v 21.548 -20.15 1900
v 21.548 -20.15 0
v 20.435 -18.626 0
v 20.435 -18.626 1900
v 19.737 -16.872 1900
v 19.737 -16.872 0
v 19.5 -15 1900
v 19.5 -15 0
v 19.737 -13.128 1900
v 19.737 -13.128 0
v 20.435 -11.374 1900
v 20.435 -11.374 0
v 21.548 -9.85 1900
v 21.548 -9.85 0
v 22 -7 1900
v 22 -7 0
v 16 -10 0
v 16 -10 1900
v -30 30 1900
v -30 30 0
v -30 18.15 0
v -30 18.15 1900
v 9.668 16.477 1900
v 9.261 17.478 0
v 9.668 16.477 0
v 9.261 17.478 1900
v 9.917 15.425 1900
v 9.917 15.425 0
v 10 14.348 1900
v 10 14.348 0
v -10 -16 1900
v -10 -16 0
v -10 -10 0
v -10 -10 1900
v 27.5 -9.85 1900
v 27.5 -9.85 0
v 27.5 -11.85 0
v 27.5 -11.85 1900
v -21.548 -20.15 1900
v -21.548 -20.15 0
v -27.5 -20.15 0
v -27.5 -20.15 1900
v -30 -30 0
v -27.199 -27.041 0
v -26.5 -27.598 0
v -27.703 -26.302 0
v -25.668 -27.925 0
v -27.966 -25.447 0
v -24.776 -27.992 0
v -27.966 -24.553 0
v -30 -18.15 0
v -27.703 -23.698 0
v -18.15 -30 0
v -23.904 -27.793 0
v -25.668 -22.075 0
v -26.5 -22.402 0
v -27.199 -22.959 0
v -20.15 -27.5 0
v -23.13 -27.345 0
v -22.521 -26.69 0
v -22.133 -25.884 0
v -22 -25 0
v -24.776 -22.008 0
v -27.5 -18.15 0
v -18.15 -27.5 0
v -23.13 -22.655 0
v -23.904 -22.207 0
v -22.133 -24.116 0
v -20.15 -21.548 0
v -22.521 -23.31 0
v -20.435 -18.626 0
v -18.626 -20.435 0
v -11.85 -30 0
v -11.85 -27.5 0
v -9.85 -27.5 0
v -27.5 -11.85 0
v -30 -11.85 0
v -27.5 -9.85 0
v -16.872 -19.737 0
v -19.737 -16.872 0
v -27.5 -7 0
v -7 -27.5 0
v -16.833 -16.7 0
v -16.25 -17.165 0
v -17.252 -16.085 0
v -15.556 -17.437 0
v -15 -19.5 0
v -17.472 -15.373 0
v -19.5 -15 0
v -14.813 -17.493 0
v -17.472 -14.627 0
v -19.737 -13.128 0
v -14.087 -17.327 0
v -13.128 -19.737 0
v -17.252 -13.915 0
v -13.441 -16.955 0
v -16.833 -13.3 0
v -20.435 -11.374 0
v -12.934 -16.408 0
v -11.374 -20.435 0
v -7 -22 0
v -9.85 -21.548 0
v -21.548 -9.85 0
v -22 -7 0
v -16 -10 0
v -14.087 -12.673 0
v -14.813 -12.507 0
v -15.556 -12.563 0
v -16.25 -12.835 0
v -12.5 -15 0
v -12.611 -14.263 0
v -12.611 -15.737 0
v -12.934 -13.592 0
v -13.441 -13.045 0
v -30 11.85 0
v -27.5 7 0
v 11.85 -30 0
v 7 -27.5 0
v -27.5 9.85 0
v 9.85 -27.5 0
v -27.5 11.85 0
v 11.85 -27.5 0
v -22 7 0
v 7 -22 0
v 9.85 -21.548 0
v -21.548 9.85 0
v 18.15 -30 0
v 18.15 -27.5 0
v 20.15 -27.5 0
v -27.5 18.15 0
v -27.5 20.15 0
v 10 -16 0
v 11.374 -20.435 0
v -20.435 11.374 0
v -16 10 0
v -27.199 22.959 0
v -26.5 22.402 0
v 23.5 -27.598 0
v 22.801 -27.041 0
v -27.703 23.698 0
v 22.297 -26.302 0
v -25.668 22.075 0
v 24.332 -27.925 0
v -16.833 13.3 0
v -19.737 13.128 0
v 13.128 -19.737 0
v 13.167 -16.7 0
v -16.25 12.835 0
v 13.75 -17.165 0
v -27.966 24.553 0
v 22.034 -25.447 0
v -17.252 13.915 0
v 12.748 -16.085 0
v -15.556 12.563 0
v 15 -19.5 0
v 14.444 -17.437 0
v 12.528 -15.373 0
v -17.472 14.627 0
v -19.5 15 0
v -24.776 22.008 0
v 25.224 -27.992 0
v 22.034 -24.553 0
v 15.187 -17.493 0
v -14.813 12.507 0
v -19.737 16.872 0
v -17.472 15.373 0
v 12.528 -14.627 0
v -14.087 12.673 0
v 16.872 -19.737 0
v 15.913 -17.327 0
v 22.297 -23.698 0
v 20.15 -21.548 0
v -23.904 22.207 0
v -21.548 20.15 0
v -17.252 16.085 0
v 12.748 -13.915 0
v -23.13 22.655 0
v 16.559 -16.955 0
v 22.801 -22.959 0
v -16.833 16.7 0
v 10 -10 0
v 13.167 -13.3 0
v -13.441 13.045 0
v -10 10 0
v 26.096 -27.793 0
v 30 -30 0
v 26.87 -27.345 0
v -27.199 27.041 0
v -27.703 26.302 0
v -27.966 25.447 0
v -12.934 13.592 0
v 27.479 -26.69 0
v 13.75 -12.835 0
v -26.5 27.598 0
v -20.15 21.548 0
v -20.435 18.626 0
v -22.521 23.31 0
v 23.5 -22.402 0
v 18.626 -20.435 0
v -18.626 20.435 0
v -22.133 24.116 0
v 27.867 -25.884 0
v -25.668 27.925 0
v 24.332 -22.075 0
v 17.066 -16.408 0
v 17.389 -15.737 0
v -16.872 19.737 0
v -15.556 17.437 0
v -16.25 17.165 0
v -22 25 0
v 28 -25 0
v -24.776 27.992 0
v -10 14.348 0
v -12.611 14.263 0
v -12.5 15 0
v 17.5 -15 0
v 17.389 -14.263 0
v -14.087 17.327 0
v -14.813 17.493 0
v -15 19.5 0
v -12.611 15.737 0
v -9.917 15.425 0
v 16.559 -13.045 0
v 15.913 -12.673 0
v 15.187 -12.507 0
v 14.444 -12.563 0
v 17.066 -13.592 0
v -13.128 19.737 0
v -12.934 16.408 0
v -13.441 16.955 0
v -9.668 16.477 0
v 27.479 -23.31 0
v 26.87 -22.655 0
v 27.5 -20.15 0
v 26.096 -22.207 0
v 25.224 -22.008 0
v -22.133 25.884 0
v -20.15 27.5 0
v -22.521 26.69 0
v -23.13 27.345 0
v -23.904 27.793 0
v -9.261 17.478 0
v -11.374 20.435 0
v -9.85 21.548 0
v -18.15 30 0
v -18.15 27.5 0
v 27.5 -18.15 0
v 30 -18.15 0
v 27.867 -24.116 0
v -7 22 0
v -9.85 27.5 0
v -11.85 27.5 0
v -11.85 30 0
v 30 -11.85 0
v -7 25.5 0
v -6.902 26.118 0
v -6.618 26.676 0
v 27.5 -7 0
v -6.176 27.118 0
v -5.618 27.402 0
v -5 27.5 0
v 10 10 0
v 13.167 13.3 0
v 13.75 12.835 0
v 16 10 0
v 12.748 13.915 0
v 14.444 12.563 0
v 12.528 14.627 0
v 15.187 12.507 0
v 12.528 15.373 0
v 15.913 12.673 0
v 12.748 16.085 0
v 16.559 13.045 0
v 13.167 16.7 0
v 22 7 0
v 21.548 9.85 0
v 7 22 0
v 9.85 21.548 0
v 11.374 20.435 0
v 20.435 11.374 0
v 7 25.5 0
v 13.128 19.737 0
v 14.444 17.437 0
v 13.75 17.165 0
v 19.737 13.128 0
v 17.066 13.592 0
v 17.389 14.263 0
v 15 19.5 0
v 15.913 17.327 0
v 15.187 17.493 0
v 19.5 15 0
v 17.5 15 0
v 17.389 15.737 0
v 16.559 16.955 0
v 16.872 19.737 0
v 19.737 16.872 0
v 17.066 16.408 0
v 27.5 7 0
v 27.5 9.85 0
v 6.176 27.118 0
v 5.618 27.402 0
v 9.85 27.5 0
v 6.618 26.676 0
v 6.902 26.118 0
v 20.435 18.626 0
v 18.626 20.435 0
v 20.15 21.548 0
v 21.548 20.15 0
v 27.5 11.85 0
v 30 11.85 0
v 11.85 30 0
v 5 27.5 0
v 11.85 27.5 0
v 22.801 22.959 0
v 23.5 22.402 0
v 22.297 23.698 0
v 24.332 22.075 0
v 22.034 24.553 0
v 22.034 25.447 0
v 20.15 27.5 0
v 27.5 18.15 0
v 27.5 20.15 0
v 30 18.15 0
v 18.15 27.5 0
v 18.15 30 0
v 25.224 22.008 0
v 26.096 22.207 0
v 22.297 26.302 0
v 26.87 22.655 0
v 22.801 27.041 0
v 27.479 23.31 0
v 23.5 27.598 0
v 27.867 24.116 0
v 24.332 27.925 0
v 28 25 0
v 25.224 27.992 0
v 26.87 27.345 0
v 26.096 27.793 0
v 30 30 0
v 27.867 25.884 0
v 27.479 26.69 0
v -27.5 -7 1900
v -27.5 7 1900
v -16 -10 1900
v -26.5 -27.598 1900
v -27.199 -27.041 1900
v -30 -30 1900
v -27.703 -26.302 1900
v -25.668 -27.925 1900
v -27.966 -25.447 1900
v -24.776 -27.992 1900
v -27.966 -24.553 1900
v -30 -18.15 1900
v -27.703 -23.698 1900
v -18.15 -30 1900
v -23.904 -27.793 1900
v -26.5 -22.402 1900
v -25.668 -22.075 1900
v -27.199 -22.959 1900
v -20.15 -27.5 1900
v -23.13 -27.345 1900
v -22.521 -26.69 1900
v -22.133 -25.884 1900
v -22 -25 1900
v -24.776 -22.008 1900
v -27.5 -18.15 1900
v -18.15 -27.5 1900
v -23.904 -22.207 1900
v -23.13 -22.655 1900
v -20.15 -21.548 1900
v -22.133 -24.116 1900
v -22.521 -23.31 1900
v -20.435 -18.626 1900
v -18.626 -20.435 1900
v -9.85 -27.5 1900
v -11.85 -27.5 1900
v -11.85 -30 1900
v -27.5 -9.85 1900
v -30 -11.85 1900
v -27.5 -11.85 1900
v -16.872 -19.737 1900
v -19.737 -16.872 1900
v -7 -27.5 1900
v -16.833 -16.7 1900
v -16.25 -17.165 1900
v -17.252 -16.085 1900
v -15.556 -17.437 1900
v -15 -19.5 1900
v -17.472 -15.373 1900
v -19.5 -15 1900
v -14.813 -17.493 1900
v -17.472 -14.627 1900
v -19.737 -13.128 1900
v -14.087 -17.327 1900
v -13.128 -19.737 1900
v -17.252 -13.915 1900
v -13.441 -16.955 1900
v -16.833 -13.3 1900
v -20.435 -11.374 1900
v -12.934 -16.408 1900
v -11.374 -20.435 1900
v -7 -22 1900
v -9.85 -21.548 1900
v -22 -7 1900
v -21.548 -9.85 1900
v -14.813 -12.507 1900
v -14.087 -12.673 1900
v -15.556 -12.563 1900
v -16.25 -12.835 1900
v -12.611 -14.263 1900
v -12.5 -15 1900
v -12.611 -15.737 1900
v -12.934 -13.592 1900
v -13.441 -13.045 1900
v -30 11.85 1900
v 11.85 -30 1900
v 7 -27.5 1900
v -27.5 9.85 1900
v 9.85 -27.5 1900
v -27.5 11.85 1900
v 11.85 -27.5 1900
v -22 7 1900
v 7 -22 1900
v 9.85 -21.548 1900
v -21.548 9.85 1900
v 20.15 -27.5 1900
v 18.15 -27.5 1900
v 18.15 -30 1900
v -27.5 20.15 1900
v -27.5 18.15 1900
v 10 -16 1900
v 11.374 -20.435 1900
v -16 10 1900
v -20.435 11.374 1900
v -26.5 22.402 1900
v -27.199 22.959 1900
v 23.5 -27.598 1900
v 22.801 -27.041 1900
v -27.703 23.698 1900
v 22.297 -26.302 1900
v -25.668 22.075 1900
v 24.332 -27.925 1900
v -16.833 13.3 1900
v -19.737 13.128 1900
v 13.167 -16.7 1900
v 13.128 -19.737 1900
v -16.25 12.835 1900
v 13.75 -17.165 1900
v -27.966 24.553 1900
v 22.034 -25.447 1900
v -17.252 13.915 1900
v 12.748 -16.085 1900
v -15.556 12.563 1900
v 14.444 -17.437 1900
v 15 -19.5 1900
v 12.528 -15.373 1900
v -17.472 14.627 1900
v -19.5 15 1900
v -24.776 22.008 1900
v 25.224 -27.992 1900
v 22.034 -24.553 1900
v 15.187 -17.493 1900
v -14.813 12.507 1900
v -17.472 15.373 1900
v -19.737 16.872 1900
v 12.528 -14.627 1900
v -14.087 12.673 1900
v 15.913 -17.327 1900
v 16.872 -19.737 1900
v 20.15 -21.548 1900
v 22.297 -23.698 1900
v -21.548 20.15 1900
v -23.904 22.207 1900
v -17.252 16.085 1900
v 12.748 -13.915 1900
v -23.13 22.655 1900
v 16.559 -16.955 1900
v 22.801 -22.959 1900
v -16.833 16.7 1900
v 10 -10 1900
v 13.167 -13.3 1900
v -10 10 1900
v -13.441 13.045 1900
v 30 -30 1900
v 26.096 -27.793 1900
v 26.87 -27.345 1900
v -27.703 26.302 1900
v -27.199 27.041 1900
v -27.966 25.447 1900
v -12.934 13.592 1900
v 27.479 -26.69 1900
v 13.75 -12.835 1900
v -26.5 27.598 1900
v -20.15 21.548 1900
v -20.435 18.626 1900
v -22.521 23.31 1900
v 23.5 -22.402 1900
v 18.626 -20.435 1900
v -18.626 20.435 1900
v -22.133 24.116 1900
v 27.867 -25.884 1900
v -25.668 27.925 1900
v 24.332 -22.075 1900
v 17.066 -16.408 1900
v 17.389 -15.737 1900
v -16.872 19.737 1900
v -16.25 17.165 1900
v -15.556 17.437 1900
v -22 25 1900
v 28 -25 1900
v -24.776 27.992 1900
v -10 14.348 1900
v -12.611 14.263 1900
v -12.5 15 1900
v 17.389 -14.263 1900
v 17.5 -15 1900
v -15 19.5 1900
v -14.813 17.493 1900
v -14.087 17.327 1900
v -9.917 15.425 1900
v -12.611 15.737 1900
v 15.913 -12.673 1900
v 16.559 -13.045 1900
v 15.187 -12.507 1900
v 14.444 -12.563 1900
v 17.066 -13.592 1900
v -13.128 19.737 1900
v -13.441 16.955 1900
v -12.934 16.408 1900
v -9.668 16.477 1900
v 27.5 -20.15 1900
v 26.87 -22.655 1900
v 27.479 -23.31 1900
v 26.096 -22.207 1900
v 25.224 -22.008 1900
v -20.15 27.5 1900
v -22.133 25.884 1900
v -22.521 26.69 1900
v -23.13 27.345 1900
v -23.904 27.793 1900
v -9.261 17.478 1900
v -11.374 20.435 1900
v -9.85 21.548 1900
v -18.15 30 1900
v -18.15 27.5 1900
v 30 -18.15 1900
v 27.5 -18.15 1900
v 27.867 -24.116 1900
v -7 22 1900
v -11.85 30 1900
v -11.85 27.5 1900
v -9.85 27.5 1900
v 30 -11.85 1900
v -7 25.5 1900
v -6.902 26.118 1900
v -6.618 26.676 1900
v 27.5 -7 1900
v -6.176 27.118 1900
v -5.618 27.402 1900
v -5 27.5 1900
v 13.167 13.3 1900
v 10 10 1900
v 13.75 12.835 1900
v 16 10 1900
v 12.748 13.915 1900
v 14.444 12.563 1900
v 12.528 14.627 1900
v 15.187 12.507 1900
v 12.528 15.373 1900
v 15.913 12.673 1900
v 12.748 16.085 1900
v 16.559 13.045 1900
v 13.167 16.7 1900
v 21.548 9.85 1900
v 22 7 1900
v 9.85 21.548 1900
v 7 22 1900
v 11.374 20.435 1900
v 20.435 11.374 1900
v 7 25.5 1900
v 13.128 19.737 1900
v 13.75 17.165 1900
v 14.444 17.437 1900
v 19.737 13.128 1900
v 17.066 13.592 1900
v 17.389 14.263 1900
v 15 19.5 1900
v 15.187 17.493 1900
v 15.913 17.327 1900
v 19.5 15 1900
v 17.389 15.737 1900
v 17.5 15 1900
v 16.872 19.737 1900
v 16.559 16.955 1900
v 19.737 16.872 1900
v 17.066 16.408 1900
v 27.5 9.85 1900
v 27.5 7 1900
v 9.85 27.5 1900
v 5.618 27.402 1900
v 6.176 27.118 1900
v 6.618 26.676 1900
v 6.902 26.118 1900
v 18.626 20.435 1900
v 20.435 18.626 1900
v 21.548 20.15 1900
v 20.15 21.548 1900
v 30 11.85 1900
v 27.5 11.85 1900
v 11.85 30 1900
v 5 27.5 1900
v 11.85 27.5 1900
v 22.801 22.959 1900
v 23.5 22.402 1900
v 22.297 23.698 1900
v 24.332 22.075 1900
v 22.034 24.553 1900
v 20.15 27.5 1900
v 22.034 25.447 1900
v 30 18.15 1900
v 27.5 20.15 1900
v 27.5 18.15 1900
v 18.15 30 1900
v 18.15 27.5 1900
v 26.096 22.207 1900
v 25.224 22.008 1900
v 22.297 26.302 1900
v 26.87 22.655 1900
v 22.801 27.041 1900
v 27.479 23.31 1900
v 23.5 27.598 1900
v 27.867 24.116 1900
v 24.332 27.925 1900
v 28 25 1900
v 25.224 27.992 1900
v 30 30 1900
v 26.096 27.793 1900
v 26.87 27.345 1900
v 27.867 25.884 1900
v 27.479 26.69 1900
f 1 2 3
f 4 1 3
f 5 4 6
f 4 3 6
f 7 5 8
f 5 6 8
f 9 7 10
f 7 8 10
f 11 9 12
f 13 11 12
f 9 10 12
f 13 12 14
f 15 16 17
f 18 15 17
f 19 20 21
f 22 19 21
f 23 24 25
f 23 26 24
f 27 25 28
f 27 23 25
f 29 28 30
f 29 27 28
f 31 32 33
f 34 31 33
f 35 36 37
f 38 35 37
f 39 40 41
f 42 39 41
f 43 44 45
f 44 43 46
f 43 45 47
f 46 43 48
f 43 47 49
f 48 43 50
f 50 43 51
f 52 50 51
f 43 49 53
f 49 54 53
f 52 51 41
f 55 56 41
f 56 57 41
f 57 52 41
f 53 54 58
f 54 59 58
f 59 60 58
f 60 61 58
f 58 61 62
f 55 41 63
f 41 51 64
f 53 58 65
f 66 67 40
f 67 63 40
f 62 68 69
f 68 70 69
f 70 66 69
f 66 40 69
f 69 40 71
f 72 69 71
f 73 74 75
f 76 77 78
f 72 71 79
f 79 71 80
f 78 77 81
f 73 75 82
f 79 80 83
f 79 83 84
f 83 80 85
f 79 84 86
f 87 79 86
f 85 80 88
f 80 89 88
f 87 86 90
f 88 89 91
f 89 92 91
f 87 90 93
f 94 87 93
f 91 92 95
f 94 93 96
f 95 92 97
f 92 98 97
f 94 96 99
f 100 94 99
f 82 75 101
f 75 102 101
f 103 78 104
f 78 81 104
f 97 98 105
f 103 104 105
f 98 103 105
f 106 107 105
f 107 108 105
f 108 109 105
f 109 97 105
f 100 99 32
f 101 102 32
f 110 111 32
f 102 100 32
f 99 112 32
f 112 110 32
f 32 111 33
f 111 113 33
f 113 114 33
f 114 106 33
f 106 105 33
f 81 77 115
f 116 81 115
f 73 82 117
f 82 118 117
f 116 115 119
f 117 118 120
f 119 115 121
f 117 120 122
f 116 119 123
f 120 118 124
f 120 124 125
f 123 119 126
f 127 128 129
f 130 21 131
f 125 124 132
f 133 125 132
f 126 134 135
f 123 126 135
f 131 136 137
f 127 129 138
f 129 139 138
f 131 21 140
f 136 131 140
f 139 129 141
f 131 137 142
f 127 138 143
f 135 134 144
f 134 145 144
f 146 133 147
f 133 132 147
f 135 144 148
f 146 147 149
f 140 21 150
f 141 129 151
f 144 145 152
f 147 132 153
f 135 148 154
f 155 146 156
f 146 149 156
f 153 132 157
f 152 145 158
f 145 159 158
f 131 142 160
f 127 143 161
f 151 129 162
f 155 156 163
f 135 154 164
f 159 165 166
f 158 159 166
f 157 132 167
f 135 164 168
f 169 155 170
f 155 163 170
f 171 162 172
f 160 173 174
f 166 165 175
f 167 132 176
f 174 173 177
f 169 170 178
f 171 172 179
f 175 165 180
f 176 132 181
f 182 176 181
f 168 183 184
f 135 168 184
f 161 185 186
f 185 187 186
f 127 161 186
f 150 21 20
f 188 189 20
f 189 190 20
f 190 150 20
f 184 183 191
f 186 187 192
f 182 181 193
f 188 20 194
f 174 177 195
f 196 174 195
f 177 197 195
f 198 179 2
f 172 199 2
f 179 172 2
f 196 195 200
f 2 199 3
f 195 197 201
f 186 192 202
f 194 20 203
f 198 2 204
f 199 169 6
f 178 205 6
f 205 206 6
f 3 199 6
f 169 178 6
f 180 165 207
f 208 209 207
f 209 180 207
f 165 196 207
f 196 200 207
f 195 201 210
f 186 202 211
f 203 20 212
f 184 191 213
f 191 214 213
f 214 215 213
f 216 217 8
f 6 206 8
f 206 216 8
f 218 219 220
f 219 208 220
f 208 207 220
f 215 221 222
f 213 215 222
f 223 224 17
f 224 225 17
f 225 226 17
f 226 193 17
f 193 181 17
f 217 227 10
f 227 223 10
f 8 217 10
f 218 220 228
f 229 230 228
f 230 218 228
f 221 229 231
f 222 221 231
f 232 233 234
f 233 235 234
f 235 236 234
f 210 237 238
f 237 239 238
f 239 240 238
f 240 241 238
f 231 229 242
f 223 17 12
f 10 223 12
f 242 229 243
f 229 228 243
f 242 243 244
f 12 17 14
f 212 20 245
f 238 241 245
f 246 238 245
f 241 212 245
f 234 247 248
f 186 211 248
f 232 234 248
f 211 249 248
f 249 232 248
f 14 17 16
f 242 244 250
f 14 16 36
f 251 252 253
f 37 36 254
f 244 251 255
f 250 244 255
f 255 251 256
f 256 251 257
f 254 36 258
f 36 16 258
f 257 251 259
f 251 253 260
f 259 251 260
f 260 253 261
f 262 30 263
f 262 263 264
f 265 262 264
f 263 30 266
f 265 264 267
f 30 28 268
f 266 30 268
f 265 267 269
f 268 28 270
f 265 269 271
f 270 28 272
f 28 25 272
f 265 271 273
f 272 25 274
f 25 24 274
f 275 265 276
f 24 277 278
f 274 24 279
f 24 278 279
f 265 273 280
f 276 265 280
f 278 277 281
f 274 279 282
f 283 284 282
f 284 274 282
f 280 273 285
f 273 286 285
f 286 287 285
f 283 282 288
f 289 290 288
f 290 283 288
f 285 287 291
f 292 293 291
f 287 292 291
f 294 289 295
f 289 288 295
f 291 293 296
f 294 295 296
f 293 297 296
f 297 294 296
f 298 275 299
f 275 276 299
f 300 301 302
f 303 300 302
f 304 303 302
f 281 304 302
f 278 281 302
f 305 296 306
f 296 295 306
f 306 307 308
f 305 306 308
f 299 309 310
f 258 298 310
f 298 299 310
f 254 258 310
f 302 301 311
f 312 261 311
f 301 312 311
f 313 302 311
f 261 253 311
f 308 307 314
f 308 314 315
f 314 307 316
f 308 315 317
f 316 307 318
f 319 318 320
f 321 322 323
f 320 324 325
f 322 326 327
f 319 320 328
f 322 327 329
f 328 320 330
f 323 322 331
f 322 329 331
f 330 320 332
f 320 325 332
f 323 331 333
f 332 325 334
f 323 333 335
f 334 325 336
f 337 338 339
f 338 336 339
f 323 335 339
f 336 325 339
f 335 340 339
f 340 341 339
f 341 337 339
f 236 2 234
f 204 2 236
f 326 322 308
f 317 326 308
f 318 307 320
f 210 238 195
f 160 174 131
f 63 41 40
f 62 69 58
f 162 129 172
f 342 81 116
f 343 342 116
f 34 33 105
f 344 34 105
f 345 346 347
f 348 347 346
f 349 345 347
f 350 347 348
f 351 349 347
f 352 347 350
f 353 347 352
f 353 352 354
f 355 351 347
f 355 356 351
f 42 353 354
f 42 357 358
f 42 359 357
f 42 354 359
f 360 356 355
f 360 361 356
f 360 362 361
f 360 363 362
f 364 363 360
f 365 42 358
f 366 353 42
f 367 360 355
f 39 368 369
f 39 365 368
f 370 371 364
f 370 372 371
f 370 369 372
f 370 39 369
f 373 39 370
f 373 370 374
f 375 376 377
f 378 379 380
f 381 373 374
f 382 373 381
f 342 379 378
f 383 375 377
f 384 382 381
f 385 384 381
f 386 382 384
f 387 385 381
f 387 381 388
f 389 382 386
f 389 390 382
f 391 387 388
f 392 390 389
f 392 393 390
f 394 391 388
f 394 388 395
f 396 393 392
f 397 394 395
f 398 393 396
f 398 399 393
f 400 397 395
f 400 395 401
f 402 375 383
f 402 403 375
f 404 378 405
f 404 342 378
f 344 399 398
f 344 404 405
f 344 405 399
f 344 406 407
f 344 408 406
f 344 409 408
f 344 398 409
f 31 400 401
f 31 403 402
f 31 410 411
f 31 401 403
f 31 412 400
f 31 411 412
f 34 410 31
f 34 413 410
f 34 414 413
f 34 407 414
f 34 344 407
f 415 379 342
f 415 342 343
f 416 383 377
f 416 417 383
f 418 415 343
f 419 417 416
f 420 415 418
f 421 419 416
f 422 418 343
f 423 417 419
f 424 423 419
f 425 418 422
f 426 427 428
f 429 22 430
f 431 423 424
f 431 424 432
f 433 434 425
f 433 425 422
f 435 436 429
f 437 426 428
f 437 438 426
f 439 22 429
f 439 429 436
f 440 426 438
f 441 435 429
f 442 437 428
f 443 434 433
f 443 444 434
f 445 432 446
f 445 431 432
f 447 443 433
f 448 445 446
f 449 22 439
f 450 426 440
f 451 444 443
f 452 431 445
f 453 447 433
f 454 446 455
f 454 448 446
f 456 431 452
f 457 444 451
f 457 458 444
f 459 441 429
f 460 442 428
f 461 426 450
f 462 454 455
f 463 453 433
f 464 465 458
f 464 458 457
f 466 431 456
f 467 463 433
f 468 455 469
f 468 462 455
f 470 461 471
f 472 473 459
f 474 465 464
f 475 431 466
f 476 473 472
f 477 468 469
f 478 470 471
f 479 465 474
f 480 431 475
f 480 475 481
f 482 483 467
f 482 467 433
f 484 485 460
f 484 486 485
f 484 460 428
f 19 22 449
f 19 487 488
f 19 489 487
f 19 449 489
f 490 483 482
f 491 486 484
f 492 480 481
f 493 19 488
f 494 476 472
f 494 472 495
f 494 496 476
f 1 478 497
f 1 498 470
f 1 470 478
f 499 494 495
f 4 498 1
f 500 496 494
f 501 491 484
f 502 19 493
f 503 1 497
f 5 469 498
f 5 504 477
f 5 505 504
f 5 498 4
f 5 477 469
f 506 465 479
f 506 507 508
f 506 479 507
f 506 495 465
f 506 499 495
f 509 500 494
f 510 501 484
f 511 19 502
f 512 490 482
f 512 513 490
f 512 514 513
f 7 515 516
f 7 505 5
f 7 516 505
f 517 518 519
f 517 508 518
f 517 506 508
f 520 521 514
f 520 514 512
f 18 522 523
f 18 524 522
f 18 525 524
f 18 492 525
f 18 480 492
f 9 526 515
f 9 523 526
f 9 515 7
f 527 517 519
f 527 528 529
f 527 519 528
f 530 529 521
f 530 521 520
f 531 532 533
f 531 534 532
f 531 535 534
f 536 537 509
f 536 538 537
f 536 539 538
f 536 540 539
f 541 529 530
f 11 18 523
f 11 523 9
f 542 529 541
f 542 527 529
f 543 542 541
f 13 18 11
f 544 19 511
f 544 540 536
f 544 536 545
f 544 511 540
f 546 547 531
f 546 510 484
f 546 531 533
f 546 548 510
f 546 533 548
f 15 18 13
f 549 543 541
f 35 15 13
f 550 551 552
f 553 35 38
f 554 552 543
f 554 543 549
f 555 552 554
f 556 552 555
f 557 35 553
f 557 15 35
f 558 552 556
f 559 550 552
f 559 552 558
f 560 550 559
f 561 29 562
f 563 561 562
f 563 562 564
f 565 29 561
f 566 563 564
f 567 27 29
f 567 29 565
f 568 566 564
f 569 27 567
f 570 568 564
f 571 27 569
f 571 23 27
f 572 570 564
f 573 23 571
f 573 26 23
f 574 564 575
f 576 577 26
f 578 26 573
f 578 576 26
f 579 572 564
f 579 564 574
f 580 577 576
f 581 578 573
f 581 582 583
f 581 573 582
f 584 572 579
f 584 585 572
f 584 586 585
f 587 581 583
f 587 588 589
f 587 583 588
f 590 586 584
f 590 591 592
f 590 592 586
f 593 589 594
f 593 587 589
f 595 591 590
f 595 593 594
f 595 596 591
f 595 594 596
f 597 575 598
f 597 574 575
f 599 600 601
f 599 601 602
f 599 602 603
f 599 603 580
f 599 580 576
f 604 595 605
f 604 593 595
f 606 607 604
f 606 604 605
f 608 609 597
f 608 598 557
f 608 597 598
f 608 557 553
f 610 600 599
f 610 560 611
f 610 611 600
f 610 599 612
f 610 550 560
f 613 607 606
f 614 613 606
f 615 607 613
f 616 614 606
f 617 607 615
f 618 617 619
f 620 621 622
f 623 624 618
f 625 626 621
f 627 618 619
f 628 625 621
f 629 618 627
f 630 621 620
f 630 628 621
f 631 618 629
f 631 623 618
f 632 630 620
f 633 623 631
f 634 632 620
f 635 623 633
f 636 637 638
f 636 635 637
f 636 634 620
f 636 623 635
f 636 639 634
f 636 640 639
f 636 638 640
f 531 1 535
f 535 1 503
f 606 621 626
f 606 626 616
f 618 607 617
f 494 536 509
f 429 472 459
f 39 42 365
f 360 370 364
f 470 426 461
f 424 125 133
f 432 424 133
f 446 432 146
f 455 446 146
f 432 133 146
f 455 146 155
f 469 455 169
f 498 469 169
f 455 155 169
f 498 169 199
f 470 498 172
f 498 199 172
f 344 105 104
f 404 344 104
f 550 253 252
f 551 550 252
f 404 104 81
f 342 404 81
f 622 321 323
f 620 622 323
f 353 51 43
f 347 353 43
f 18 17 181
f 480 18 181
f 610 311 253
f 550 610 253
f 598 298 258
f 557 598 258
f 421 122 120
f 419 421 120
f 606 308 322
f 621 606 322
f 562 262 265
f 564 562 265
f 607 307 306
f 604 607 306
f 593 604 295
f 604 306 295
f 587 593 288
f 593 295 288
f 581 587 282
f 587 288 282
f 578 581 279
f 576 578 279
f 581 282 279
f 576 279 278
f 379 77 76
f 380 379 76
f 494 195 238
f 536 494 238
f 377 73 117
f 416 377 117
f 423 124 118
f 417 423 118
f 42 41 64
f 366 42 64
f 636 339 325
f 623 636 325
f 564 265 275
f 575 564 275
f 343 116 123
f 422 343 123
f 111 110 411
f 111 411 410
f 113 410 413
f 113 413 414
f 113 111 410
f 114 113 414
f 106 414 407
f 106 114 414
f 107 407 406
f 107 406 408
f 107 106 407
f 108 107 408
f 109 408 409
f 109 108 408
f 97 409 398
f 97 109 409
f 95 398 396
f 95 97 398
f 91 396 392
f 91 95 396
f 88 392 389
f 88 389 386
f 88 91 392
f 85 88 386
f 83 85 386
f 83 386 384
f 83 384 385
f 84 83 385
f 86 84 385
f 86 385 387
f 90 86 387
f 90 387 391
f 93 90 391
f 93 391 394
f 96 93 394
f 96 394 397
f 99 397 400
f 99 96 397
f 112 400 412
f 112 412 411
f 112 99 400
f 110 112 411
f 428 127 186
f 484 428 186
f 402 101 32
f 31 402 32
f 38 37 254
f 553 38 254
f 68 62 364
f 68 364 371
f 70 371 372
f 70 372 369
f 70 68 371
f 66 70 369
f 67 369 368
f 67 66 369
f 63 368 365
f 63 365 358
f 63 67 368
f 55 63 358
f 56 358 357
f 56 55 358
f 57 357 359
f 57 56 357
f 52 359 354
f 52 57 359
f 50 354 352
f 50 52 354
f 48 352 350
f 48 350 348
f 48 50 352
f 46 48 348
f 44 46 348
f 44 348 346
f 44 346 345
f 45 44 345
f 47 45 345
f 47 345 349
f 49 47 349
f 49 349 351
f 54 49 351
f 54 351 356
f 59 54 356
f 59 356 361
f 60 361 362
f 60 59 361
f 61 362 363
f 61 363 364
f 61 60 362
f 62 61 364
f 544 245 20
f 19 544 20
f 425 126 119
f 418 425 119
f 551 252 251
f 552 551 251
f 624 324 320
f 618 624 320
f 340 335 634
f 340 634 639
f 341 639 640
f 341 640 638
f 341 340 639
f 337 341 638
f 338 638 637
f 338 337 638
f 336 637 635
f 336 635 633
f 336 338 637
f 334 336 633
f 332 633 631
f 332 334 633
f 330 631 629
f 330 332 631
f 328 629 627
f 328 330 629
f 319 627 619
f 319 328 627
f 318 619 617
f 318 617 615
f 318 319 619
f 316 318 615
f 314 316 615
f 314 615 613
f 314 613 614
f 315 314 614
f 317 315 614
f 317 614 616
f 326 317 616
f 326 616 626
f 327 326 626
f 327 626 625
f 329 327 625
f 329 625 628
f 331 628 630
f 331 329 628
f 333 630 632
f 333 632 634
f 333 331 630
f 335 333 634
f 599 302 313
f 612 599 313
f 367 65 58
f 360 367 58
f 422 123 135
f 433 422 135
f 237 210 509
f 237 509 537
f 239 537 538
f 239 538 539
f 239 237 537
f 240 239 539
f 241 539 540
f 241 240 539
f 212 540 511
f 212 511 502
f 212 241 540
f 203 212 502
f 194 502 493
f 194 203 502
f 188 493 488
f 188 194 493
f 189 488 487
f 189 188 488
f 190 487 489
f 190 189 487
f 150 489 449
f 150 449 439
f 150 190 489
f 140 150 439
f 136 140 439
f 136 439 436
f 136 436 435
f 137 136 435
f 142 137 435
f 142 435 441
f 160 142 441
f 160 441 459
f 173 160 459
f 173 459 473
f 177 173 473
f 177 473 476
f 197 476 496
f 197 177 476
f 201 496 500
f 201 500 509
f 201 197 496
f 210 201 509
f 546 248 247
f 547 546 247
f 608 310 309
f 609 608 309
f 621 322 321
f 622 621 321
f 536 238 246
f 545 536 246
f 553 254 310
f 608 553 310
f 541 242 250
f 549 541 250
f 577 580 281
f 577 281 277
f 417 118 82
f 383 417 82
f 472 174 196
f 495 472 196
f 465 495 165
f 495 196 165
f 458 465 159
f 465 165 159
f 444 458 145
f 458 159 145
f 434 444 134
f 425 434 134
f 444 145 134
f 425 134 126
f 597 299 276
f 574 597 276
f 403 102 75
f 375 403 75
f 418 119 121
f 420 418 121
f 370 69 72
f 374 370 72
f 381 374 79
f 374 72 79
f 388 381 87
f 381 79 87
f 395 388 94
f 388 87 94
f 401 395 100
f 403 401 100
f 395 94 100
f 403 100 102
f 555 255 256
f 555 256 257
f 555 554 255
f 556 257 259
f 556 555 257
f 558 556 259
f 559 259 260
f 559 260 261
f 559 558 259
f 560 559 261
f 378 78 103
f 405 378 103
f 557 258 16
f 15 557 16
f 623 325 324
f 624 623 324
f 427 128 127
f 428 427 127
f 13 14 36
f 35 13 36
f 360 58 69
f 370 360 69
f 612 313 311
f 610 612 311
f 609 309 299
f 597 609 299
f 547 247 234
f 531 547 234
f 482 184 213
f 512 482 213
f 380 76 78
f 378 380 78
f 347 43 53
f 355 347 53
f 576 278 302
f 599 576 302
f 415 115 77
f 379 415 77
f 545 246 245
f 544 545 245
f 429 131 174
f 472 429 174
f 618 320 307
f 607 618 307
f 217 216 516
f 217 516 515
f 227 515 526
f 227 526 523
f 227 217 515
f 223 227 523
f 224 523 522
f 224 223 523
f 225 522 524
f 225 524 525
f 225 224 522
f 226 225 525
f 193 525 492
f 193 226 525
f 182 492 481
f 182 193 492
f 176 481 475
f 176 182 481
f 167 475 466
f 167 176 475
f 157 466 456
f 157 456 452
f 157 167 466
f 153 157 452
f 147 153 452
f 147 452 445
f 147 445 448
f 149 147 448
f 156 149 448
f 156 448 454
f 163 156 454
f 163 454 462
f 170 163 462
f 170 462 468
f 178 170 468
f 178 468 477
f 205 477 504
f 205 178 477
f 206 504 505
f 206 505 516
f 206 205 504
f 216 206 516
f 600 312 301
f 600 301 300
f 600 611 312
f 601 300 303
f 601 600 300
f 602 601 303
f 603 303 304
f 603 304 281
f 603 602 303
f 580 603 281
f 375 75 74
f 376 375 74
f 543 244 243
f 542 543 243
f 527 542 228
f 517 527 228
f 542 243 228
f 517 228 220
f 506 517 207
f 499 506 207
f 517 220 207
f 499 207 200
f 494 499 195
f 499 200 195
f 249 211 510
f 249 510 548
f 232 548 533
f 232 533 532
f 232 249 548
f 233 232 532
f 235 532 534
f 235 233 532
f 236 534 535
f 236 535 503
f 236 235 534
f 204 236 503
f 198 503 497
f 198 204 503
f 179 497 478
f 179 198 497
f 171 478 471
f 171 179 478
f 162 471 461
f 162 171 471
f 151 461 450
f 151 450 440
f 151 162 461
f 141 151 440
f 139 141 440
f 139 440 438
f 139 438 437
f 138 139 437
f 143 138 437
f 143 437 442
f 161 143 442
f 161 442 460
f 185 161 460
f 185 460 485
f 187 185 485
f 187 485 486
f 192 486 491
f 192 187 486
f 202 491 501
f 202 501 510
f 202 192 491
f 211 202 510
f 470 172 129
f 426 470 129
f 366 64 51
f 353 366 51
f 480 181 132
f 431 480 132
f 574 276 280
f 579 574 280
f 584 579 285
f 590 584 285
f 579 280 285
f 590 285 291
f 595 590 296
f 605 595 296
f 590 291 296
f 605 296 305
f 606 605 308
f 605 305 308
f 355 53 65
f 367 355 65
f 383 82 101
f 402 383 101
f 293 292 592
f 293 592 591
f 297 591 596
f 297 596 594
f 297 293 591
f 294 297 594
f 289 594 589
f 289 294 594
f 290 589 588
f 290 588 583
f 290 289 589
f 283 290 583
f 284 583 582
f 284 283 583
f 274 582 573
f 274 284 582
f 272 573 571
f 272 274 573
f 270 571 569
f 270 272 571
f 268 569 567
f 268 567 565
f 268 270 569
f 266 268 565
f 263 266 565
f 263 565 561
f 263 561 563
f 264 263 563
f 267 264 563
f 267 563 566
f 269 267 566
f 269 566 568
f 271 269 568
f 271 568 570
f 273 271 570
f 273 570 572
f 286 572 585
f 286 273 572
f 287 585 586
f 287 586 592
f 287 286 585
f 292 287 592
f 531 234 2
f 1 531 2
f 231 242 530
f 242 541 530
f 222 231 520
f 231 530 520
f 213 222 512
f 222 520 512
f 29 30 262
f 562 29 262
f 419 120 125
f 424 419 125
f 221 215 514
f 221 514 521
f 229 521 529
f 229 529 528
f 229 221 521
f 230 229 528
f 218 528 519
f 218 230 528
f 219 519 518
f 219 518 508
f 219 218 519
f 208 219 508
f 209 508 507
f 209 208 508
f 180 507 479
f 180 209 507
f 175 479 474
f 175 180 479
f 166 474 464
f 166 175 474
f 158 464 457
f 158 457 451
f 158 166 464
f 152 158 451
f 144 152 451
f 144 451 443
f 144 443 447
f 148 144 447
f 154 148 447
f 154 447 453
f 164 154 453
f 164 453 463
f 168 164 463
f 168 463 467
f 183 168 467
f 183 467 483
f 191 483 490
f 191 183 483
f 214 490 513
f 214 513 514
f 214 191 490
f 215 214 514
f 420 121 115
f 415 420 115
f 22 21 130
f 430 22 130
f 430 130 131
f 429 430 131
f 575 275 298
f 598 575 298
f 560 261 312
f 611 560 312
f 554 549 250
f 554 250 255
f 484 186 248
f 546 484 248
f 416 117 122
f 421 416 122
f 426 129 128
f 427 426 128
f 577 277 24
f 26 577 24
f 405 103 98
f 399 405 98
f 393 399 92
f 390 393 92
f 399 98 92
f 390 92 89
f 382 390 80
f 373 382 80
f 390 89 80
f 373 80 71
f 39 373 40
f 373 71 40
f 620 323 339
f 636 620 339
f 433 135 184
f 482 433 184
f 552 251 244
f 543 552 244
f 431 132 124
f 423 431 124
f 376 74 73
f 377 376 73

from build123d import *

# Parameters (mm, degrees)
F0_R     = 3
F0_R_2   = 2.5
F1_DEPTH = 1900
F2_R     = 2
F3_R     = 7


# Not quite as in the source:
# - a feature names something its author has since deleted; it is built from what else it names


with BuildPart() as f1:
    # F0 (on Top) → F1 (new body)
    with BuildSketch(Plane.XY):
        with BuildLine():
            Line((18.15, -30), (30, -30))
            Line((30, -30), (30, -18.15))
            Line((30, -18.15), (27.5, -18.15))
            Line((27.5, -18.15), (27.5, -20.15))
            Line((27.5, -20.15), (21.5477069044, -20.15))
            ThreePointArc((21.5477069044, -20.15), (19.5, -15), (21.5477069044, -9.85))
            Line((21.5477069044, -9.85), (27.5, -9.85))
            Line((27.5, -9.85), (27.5, -11.85))
            Line((27.5, -11.85), (30, -11.85))
            Line((30, -11.85), (30, 11.85))
            Line((30, 11.85), (27.5, 11.85))
            Line((27.5, 11.85), (27.5, 9.85))
            Line((27.5, 9.85), (21.5477069044, 9.85))
            ThreePointArc((21.5477069044, 9.85), (19.5, 15), (21.5477069044, 20.15))
            Line((21.5477069044, 20.15), (27.5, 20.15))
            Line((27.5, 20.15), (27.5, 18.15))
            Line((27.5, 18.15), (30, 18.15))
            Line((30, 18.15), (30, 30))
            Line((30, 30), (18.15, 30))
            Line((18.15, 30), (18.15, 27.5))
            Line((18.15, 27.5), (20.15, 27.5))
            Line((20.15, 27.5), (20.15, 21.5477069044))
            ThreePointArc((20.15, 21.5477069044), (15, 19.5), (9.85, 21.5477069044))
            Line((9.85, 21.5477069044), (9.85, 27.5))
            Line((9.85, 27.5), (11.85, 27.5))
            Line((11.85, 27.5), (11.85, 30))
            Line((11.85, 30), (-11.85, 30))
            Line((-11.85, 30), (-11.85, 27.5))
            Line((-11.85, 27.5), (-9.85, 27.5))
            Line((-9.85, 27.5), (-9.85, 21.5477069044))
            ThreePointArc((-9.85, 21.5477069044), (-15, 19.5), (-20.15, 21.5477069044))
            Line((-20.15, 21.5477069044), (-20.15, 27.5))
            Line((-20.15, 27.5), (-18.15, 27.5))
            Line((-18.15, 27.5), (-18.15, 30))
            Line((-18.15, 30), (-30, 30))
            Line((-30, 30), (-30, 18.15))
            Line((-30, 18.15), (-27.5, 18.15))
            Line((-27.5, 18.15), (-27.5, 20.15))
            Line((-27.5, 20.15), (-21.5477069044, 20.15))
            ThreePointArc((-21.5477069044, 20.15), (-19.5, 15), (-21.5477069044, 9.85))
            Line((-21.5477069044, 9.85), (-27.5, 9.85))
            Line((-27.5, 9.85), (-27.5, 11.85))
            Line((-27.5, 11.85), (-30, 11.85))
            Line((-30, 11.85), (-30, -11.85))
            Line((-30, -11.85), (-27.5, -11.85))
            Line((-27.5, -11.85), (-27.5, -9.85))
            Line((-27.5, -9.85), (-21.5477069044, -9.85))
            ThreePointArc((-21.5477069044, -9.85), (-19.5, -15), (-21.5477069044, -20.15))
            Line((-21.5477069044, -20.15), (-27.5, -20.15))
            Line((-27.5, -20.15), (-27.5, -18.15))
            Line((-27.5, -18.15), (-30, -18.15))
            Line((-30, -18.15), (-30, -30))
            Line((-30, -30), (-18.15, -30))
            Line((-18.15, -30), (-18.15, -27.5))
            Line((-18.15, -27.5), (-20.15, -27.5))
            Line((-20.15, -27.5), (-20.15, -21.5477069044))
            ThreePointArc((-20.15, -21.5477069044), (-15, -19.5), (-9.85, -21.5477069044))
            Line((-9.85, -21.5477069044), (-9.85, -27.5))
            Line((-9.85, -27.5), (-11.85, -27.5))
            Line((-11.85, -27.5), (-11.85, -30))
            Line((-11.85, -30), (11.85, -30))
            Line((11.85, -30), (11.85, -27.5))
            Line((11.85, -27.5), (9.85, -27.5))
            Line((9.85, -27.5), (9.85, -21.5477069044))
            ThreePointArc((9.85, -21.5477069044), (15, -19.5), (20.15, -21.5477069044))
            Line((20.15, -21.5477069044), (20.15, -27.5))
            Line((20.15, -27.5), (18.15, -27.5))
            Line((18.15, -27.5), (18.15, -30))
        make_face()
        with Locations((-25, -25)):
            Circle(F0_R, mode=Mode.SUBTRACT)
        with Locations((-15, -15)):
            Circle(F0_R_2, mode=Mode.SUBTRACT)
        with Locations((25, -25)):
            Circle(F0_R, mode=Mode.SUBTRACT)
        with Locations((15, -15)):
            Circle(F0_R_2, mode=Mode.SUBTRACT)
        with Locations((-25, 25)):
            Circle(F0_R, mode=Mode.SUBTRACT)
        with Locations((-15, 15)):
            Circle(F0_R_2, mode=Mode.SUBTRACT)
        Polygon((-7, 22), (-7, 27.5), (0, 27.5), (7, 27.5), (7, 22), (10, 16), (10, 10), (16, 10), (22, 7), (27.5, 7), (27.5, 0), (27.5, -7), (22, -7), (16, -10), (10, -10), (10, -16), (7, -22), (7, -27.5), (0, -27.5), (-7, -27.5), (-7, -22), (-10, -16), (-10, -10), (-16, -10), (-22, -7), (-27.5, -7), (-27.5, 0), (-27.5, 7), (-22, 7), (-16, 10), (-10, 10), (-10, 16), align=None, mode=Mode.SUBTRACT)
        with Locations((15, 15)):
            Circle(F0_R_2, mode=Mode.SUBTRACT)
        with Locations((25, 25)):
            Circle(F0_R, mode=Mode.SUBTRACT)
    extrude(amount=F1_DEPTH)

    # F2
    f2_edges = [f1.edges().sort_by_distance(p)[0] for p in [
        (-7, 27.5, 950),
        (7, 27.5, 950),
    ]]
    fillet(f2_edges, radius=F2_R)

    # F3
    f3_edges = [f1.edges().sort_by_distance(p)[0] for p in [
        (-10, 16, 950),
        (10, 16, 950),
    ]]
    fillet(f3_edges, radius=F3_R)


solid = f1.part
